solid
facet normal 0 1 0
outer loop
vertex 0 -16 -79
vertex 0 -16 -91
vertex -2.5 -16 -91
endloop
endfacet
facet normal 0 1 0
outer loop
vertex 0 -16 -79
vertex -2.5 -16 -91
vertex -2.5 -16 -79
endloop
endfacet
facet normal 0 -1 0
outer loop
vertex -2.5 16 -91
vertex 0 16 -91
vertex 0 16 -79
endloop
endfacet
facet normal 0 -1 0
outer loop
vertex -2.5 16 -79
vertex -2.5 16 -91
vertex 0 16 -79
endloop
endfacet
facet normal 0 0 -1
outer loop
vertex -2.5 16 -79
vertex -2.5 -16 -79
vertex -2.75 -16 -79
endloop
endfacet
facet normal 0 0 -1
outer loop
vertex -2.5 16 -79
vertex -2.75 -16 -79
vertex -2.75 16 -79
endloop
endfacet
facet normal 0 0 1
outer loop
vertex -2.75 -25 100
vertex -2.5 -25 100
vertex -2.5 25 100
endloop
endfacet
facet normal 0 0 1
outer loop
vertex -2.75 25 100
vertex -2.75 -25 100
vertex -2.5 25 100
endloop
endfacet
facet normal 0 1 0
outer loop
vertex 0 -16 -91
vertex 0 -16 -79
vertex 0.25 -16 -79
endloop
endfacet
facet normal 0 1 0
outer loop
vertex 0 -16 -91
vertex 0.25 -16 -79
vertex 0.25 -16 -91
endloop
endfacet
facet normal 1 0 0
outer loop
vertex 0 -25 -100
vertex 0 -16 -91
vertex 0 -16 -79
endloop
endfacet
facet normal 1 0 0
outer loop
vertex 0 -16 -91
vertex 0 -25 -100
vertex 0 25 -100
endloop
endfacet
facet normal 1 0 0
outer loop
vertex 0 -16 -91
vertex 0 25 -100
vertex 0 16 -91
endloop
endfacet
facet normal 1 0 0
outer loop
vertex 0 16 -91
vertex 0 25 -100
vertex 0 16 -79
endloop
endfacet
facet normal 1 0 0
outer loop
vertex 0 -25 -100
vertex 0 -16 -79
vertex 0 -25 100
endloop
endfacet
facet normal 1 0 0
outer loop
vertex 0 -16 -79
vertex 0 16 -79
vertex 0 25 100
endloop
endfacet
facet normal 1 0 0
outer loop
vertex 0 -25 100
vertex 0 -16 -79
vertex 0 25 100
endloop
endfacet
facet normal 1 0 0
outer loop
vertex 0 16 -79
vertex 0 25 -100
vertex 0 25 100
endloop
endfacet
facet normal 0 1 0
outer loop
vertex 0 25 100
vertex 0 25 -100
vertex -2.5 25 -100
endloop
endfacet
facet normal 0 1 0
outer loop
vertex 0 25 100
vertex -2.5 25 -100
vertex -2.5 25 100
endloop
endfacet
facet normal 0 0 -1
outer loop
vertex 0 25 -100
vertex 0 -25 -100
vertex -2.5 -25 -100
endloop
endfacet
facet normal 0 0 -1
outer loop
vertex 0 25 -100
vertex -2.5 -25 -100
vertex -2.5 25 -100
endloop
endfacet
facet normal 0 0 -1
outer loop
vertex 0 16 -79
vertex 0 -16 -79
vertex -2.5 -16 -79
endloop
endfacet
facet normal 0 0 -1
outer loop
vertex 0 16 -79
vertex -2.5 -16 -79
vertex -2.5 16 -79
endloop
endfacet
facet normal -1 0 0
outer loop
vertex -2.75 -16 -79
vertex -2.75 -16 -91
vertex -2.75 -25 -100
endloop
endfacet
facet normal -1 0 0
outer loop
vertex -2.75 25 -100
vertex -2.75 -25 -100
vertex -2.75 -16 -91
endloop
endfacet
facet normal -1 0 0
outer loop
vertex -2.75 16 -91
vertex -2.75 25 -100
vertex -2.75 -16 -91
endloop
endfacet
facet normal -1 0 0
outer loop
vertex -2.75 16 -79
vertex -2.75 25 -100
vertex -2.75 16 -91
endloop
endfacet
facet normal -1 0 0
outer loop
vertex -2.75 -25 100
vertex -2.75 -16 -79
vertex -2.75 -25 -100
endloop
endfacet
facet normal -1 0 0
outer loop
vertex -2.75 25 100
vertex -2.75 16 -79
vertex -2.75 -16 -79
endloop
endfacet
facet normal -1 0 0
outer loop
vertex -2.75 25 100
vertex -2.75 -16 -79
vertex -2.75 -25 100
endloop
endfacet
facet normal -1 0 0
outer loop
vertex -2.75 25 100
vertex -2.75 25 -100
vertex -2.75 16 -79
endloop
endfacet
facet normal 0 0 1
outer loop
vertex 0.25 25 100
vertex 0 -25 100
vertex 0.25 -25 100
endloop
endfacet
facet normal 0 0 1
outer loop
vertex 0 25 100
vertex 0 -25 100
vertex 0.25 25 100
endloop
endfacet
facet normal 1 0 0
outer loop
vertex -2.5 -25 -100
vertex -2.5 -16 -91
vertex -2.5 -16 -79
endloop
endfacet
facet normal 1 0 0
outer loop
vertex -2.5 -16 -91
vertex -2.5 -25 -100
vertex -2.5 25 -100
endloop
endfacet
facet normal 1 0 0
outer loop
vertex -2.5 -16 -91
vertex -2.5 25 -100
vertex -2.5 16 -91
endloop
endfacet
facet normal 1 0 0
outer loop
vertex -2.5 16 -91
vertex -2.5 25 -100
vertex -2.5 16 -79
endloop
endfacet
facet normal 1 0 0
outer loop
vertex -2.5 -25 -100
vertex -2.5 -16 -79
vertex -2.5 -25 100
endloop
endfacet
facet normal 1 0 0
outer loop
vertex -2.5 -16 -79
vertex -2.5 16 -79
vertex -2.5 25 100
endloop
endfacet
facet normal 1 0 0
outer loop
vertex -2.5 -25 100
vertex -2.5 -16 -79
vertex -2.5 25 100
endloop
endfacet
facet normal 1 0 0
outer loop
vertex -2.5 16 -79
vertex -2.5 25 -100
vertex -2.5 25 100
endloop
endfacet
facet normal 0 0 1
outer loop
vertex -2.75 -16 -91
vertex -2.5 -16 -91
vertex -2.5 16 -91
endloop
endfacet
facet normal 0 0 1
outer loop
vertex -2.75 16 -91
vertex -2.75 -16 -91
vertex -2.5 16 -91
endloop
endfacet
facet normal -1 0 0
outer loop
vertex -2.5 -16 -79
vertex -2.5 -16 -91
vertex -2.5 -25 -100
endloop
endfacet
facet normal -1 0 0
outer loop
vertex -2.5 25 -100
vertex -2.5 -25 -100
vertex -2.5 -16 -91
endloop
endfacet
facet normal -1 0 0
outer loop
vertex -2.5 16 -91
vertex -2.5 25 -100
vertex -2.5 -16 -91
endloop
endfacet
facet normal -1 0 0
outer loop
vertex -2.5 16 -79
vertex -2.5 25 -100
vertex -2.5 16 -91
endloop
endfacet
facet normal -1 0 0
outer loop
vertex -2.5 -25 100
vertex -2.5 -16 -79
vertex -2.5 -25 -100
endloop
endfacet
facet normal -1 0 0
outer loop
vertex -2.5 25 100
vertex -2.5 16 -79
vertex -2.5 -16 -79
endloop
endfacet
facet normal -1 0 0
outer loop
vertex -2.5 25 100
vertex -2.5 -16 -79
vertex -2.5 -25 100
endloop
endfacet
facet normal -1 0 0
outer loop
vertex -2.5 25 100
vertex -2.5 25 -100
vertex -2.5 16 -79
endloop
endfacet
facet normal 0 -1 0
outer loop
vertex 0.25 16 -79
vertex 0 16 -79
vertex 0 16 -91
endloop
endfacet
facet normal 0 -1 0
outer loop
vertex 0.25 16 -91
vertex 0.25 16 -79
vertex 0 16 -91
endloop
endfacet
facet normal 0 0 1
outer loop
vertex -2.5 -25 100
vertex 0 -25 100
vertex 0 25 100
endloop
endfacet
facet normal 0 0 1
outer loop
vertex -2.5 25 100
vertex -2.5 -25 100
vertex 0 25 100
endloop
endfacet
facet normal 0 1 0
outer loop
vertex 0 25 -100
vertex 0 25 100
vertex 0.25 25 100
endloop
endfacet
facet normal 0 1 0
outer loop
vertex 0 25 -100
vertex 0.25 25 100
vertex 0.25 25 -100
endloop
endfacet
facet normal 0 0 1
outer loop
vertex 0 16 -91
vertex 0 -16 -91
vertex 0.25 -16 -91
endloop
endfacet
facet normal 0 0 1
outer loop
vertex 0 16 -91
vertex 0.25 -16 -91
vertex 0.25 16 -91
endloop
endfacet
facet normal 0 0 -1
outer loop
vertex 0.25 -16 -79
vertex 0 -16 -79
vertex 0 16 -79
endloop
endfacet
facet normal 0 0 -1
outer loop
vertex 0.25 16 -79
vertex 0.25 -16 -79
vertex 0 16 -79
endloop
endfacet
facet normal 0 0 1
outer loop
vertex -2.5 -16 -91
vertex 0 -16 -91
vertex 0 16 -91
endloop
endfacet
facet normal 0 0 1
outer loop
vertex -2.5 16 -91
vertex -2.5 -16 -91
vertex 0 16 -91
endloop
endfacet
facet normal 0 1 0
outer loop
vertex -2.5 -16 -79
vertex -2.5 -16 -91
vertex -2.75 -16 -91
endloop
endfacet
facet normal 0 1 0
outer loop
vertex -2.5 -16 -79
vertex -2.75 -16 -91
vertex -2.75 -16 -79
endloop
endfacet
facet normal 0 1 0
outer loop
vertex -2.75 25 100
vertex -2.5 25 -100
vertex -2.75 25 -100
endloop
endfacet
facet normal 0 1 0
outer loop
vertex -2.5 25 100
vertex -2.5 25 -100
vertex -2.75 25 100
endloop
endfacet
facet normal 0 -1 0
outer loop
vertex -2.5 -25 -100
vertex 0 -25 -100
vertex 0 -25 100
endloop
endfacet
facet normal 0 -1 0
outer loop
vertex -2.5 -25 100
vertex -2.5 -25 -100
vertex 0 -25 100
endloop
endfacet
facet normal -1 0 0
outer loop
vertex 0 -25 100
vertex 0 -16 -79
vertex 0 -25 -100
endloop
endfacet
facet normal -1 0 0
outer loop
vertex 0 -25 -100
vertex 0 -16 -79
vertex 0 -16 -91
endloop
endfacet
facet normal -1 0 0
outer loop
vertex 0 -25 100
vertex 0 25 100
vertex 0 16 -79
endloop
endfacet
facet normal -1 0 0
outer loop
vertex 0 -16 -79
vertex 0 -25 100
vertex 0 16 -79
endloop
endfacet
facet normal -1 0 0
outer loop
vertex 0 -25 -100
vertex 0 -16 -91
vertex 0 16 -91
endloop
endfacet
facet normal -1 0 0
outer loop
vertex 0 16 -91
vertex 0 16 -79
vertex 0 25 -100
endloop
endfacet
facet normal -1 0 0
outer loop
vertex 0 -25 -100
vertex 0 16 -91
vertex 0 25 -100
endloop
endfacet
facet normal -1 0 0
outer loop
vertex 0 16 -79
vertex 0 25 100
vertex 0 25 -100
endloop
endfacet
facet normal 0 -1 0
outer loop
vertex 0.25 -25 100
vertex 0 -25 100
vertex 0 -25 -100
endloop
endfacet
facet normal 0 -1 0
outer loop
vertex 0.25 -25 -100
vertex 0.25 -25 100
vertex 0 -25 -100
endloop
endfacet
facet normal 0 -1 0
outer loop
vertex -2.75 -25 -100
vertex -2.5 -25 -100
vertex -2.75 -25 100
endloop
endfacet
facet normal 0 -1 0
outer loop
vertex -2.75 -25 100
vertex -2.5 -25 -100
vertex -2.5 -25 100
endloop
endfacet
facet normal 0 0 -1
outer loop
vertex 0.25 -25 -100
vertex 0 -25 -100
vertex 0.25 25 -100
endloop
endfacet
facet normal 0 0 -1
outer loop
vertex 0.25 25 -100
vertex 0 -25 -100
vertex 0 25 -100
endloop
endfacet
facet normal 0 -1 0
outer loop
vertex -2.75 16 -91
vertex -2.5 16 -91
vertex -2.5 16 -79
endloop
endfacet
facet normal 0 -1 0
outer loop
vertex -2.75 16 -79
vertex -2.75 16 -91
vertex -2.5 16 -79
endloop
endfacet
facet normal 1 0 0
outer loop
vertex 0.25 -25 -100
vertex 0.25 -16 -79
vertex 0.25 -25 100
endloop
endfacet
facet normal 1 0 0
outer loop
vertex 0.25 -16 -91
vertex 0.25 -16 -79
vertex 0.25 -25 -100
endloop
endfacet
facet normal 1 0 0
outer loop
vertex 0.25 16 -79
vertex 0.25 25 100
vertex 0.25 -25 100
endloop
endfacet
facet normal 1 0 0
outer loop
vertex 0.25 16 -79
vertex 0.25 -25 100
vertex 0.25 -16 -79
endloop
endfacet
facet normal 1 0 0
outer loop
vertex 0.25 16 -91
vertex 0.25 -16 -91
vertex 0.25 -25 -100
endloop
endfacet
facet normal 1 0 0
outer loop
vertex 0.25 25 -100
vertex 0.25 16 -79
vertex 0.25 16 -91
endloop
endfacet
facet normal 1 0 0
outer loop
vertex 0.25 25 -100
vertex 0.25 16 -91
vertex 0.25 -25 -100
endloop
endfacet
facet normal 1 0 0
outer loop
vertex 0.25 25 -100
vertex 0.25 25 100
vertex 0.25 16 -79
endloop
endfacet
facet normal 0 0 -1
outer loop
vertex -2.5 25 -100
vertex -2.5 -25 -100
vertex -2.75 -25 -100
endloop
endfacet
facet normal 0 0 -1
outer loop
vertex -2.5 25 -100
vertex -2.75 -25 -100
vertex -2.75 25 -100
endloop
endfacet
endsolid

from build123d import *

# Parameters (mm, degrees)
SKETCH1_W           = 200
SKETCH1_H           = 50
SKETCH1_W_2         = 12
SKETCH1_H_2         = 32
BOSS_EXTRUDE1_DEPTH = 0.25
SKETCH2_W           = 200
SKETCH2_H           = 50
SKETCH2_W_2         = 12
SKETCH2_H_2         = 32
BOSS_EXTRUDE2_DEPTH = 2.5
SKETCH3_W           = 200
SKETCH3_H           = 50
SKETCH3_W_2         = 12
SKETCH3_H_2         = 32
BOSS_EXTRUDE3_DEPTH = 0.25


with BuildPart() as part:
    # Sketch1 → Boss-Extrude1 (new body)
    with BuildSketch(Plane(origin=(0, 0, 0), x_dir=(0, 0, -1), z_dir=(1, 0, 0))):
        Rectangle(SKETCH1_W, SKETCH1_H)
        with Locations((85, 0)):
            Rectangle(SKETCH1_W_2, SKETCH1_H_2, mode=Mode.SUBTRACT)
    extrude(amount=BOSS_EXTRUDE1_DEPTH)


with BuildPart() as body_2:
    # Sketch2 → Boss-Extrude2 (new body)
    with BuildSketch(Plane.ZY):
        Rectangle(SKETCH2_W, SKETCH2_H)
        with Locations((-85, 0)):
            Rectangle(SKETCH2_W_2, SKETCH2_H_2, mode=Mode.SUBTRACT)
    extrude(amount=BOSS_EXTRUDE2_DEPTH)


with BuildPart() as body_3:
    # Sketch3 → Boss-Extrude3 (new body)
    with BuildSketch(Plane.ZY.offset(2.5)):
        Rectangle(SKETCH3_W, SKETCH3_H)
        with Locations((-85, 0)):
            Rectangle(SKETCH3_W_2, SKETCH3_H_2, mode=Mode.SUBTRACT)
    extrude(amount=BOSS_EXTRUDE3_DEPTH)


solid = Compound([part.part, body_2.part, body_3.part])
